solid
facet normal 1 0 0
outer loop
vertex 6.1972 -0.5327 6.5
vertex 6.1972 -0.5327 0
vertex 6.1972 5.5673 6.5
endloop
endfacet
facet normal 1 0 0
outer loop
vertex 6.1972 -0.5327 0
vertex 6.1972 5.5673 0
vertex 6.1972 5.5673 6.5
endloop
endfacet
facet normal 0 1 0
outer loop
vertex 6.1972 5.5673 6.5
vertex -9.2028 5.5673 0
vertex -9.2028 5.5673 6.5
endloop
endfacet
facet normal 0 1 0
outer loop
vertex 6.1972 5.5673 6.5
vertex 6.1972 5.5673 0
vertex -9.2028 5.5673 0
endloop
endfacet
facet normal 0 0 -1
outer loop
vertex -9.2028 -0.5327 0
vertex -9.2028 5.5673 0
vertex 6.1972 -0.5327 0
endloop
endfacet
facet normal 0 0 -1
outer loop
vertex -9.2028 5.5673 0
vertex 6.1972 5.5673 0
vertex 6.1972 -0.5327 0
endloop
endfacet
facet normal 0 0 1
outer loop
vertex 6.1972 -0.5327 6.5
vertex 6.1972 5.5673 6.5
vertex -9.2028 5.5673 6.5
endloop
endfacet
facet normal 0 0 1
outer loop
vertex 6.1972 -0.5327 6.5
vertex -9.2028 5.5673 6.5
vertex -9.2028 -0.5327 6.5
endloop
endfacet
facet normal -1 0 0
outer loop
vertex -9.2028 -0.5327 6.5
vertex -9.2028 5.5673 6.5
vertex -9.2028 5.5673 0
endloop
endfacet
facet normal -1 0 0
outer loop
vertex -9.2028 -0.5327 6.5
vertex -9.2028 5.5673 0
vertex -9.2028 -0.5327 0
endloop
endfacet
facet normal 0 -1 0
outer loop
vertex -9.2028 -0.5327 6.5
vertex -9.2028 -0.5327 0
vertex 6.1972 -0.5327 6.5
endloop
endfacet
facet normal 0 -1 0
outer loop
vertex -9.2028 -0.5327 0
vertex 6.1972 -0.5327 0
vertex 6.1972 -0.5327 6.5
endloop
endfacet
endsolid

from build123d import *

# Parameters (mm, degrees)
F6_W      = 13.4
F6_H      = 4.1
F0_DEPTH  = 6.5
F1_DEPTH  = 1
F2_DEPTH  = 1
F4_DEPTH  = 1
F3_W      = 5.1
F3_H      = 6.5
F4_FACE_W = 6.1
F4_FACE_H = 6.5
F7_DEPTH  = 1


with BuildPart() as f0:
    # F6 (on Top) → F0 (new body)
    with BuildSketch(Plane.XY):
        with Locations((-1.5027523041, 2.5173463665)):
            Rectangle(F6_W, F6_H)
    extrude(amount=F0_DEPTH)

    # F1 (add): a face of the model
    f1_faces = [f0.faces().sort_by_distance(p)[0] for p in [
        (-1.5027523041, 4.5673463665, 3.25),
    ]]
    extrude(f1_faces, amount=F1_DEPTH)

    # F2 (add): a face of the model
    f2_faces = [f0.faces().sort_by_distance(p)[0] for p in [
        (5.1972476959, 3.0173463665, 3.25),
    ]]
    extrude(f2_faces, amount=F2_DEPTH)

    # F4 (add): a face of the model
    f4_faces = [f0.faces().sort_by_distance(p)[0] for p in [
        (-1.0027523041, 0.4673463665, 3.25),
    ]]
    extrude(f4_faces, amount=F4_DEPTH)

    # F3 (on face) + F4_face (on face) → F7 (join)
    with BuildSketch(Plane(origin=(-8.2027523041, 0, 0), x_dir=(0, -1, 0), z_dir=(-1, 0, 0))):
        with Locations((-3.0173463665, 3.25)):
            Rectangle(F3_W, F3_H)
    with BuildSketch(Plane(origin=(-8.2027523041, 2.5173463665, 3.25), x_dir=(0, -1, 0), z_dir=(-1, 0, 0))):
        Rectangle(F4_FACE_W, F4_FACE_H)
    extrude(amount=F7_DEPTH)


solid = f0.part
